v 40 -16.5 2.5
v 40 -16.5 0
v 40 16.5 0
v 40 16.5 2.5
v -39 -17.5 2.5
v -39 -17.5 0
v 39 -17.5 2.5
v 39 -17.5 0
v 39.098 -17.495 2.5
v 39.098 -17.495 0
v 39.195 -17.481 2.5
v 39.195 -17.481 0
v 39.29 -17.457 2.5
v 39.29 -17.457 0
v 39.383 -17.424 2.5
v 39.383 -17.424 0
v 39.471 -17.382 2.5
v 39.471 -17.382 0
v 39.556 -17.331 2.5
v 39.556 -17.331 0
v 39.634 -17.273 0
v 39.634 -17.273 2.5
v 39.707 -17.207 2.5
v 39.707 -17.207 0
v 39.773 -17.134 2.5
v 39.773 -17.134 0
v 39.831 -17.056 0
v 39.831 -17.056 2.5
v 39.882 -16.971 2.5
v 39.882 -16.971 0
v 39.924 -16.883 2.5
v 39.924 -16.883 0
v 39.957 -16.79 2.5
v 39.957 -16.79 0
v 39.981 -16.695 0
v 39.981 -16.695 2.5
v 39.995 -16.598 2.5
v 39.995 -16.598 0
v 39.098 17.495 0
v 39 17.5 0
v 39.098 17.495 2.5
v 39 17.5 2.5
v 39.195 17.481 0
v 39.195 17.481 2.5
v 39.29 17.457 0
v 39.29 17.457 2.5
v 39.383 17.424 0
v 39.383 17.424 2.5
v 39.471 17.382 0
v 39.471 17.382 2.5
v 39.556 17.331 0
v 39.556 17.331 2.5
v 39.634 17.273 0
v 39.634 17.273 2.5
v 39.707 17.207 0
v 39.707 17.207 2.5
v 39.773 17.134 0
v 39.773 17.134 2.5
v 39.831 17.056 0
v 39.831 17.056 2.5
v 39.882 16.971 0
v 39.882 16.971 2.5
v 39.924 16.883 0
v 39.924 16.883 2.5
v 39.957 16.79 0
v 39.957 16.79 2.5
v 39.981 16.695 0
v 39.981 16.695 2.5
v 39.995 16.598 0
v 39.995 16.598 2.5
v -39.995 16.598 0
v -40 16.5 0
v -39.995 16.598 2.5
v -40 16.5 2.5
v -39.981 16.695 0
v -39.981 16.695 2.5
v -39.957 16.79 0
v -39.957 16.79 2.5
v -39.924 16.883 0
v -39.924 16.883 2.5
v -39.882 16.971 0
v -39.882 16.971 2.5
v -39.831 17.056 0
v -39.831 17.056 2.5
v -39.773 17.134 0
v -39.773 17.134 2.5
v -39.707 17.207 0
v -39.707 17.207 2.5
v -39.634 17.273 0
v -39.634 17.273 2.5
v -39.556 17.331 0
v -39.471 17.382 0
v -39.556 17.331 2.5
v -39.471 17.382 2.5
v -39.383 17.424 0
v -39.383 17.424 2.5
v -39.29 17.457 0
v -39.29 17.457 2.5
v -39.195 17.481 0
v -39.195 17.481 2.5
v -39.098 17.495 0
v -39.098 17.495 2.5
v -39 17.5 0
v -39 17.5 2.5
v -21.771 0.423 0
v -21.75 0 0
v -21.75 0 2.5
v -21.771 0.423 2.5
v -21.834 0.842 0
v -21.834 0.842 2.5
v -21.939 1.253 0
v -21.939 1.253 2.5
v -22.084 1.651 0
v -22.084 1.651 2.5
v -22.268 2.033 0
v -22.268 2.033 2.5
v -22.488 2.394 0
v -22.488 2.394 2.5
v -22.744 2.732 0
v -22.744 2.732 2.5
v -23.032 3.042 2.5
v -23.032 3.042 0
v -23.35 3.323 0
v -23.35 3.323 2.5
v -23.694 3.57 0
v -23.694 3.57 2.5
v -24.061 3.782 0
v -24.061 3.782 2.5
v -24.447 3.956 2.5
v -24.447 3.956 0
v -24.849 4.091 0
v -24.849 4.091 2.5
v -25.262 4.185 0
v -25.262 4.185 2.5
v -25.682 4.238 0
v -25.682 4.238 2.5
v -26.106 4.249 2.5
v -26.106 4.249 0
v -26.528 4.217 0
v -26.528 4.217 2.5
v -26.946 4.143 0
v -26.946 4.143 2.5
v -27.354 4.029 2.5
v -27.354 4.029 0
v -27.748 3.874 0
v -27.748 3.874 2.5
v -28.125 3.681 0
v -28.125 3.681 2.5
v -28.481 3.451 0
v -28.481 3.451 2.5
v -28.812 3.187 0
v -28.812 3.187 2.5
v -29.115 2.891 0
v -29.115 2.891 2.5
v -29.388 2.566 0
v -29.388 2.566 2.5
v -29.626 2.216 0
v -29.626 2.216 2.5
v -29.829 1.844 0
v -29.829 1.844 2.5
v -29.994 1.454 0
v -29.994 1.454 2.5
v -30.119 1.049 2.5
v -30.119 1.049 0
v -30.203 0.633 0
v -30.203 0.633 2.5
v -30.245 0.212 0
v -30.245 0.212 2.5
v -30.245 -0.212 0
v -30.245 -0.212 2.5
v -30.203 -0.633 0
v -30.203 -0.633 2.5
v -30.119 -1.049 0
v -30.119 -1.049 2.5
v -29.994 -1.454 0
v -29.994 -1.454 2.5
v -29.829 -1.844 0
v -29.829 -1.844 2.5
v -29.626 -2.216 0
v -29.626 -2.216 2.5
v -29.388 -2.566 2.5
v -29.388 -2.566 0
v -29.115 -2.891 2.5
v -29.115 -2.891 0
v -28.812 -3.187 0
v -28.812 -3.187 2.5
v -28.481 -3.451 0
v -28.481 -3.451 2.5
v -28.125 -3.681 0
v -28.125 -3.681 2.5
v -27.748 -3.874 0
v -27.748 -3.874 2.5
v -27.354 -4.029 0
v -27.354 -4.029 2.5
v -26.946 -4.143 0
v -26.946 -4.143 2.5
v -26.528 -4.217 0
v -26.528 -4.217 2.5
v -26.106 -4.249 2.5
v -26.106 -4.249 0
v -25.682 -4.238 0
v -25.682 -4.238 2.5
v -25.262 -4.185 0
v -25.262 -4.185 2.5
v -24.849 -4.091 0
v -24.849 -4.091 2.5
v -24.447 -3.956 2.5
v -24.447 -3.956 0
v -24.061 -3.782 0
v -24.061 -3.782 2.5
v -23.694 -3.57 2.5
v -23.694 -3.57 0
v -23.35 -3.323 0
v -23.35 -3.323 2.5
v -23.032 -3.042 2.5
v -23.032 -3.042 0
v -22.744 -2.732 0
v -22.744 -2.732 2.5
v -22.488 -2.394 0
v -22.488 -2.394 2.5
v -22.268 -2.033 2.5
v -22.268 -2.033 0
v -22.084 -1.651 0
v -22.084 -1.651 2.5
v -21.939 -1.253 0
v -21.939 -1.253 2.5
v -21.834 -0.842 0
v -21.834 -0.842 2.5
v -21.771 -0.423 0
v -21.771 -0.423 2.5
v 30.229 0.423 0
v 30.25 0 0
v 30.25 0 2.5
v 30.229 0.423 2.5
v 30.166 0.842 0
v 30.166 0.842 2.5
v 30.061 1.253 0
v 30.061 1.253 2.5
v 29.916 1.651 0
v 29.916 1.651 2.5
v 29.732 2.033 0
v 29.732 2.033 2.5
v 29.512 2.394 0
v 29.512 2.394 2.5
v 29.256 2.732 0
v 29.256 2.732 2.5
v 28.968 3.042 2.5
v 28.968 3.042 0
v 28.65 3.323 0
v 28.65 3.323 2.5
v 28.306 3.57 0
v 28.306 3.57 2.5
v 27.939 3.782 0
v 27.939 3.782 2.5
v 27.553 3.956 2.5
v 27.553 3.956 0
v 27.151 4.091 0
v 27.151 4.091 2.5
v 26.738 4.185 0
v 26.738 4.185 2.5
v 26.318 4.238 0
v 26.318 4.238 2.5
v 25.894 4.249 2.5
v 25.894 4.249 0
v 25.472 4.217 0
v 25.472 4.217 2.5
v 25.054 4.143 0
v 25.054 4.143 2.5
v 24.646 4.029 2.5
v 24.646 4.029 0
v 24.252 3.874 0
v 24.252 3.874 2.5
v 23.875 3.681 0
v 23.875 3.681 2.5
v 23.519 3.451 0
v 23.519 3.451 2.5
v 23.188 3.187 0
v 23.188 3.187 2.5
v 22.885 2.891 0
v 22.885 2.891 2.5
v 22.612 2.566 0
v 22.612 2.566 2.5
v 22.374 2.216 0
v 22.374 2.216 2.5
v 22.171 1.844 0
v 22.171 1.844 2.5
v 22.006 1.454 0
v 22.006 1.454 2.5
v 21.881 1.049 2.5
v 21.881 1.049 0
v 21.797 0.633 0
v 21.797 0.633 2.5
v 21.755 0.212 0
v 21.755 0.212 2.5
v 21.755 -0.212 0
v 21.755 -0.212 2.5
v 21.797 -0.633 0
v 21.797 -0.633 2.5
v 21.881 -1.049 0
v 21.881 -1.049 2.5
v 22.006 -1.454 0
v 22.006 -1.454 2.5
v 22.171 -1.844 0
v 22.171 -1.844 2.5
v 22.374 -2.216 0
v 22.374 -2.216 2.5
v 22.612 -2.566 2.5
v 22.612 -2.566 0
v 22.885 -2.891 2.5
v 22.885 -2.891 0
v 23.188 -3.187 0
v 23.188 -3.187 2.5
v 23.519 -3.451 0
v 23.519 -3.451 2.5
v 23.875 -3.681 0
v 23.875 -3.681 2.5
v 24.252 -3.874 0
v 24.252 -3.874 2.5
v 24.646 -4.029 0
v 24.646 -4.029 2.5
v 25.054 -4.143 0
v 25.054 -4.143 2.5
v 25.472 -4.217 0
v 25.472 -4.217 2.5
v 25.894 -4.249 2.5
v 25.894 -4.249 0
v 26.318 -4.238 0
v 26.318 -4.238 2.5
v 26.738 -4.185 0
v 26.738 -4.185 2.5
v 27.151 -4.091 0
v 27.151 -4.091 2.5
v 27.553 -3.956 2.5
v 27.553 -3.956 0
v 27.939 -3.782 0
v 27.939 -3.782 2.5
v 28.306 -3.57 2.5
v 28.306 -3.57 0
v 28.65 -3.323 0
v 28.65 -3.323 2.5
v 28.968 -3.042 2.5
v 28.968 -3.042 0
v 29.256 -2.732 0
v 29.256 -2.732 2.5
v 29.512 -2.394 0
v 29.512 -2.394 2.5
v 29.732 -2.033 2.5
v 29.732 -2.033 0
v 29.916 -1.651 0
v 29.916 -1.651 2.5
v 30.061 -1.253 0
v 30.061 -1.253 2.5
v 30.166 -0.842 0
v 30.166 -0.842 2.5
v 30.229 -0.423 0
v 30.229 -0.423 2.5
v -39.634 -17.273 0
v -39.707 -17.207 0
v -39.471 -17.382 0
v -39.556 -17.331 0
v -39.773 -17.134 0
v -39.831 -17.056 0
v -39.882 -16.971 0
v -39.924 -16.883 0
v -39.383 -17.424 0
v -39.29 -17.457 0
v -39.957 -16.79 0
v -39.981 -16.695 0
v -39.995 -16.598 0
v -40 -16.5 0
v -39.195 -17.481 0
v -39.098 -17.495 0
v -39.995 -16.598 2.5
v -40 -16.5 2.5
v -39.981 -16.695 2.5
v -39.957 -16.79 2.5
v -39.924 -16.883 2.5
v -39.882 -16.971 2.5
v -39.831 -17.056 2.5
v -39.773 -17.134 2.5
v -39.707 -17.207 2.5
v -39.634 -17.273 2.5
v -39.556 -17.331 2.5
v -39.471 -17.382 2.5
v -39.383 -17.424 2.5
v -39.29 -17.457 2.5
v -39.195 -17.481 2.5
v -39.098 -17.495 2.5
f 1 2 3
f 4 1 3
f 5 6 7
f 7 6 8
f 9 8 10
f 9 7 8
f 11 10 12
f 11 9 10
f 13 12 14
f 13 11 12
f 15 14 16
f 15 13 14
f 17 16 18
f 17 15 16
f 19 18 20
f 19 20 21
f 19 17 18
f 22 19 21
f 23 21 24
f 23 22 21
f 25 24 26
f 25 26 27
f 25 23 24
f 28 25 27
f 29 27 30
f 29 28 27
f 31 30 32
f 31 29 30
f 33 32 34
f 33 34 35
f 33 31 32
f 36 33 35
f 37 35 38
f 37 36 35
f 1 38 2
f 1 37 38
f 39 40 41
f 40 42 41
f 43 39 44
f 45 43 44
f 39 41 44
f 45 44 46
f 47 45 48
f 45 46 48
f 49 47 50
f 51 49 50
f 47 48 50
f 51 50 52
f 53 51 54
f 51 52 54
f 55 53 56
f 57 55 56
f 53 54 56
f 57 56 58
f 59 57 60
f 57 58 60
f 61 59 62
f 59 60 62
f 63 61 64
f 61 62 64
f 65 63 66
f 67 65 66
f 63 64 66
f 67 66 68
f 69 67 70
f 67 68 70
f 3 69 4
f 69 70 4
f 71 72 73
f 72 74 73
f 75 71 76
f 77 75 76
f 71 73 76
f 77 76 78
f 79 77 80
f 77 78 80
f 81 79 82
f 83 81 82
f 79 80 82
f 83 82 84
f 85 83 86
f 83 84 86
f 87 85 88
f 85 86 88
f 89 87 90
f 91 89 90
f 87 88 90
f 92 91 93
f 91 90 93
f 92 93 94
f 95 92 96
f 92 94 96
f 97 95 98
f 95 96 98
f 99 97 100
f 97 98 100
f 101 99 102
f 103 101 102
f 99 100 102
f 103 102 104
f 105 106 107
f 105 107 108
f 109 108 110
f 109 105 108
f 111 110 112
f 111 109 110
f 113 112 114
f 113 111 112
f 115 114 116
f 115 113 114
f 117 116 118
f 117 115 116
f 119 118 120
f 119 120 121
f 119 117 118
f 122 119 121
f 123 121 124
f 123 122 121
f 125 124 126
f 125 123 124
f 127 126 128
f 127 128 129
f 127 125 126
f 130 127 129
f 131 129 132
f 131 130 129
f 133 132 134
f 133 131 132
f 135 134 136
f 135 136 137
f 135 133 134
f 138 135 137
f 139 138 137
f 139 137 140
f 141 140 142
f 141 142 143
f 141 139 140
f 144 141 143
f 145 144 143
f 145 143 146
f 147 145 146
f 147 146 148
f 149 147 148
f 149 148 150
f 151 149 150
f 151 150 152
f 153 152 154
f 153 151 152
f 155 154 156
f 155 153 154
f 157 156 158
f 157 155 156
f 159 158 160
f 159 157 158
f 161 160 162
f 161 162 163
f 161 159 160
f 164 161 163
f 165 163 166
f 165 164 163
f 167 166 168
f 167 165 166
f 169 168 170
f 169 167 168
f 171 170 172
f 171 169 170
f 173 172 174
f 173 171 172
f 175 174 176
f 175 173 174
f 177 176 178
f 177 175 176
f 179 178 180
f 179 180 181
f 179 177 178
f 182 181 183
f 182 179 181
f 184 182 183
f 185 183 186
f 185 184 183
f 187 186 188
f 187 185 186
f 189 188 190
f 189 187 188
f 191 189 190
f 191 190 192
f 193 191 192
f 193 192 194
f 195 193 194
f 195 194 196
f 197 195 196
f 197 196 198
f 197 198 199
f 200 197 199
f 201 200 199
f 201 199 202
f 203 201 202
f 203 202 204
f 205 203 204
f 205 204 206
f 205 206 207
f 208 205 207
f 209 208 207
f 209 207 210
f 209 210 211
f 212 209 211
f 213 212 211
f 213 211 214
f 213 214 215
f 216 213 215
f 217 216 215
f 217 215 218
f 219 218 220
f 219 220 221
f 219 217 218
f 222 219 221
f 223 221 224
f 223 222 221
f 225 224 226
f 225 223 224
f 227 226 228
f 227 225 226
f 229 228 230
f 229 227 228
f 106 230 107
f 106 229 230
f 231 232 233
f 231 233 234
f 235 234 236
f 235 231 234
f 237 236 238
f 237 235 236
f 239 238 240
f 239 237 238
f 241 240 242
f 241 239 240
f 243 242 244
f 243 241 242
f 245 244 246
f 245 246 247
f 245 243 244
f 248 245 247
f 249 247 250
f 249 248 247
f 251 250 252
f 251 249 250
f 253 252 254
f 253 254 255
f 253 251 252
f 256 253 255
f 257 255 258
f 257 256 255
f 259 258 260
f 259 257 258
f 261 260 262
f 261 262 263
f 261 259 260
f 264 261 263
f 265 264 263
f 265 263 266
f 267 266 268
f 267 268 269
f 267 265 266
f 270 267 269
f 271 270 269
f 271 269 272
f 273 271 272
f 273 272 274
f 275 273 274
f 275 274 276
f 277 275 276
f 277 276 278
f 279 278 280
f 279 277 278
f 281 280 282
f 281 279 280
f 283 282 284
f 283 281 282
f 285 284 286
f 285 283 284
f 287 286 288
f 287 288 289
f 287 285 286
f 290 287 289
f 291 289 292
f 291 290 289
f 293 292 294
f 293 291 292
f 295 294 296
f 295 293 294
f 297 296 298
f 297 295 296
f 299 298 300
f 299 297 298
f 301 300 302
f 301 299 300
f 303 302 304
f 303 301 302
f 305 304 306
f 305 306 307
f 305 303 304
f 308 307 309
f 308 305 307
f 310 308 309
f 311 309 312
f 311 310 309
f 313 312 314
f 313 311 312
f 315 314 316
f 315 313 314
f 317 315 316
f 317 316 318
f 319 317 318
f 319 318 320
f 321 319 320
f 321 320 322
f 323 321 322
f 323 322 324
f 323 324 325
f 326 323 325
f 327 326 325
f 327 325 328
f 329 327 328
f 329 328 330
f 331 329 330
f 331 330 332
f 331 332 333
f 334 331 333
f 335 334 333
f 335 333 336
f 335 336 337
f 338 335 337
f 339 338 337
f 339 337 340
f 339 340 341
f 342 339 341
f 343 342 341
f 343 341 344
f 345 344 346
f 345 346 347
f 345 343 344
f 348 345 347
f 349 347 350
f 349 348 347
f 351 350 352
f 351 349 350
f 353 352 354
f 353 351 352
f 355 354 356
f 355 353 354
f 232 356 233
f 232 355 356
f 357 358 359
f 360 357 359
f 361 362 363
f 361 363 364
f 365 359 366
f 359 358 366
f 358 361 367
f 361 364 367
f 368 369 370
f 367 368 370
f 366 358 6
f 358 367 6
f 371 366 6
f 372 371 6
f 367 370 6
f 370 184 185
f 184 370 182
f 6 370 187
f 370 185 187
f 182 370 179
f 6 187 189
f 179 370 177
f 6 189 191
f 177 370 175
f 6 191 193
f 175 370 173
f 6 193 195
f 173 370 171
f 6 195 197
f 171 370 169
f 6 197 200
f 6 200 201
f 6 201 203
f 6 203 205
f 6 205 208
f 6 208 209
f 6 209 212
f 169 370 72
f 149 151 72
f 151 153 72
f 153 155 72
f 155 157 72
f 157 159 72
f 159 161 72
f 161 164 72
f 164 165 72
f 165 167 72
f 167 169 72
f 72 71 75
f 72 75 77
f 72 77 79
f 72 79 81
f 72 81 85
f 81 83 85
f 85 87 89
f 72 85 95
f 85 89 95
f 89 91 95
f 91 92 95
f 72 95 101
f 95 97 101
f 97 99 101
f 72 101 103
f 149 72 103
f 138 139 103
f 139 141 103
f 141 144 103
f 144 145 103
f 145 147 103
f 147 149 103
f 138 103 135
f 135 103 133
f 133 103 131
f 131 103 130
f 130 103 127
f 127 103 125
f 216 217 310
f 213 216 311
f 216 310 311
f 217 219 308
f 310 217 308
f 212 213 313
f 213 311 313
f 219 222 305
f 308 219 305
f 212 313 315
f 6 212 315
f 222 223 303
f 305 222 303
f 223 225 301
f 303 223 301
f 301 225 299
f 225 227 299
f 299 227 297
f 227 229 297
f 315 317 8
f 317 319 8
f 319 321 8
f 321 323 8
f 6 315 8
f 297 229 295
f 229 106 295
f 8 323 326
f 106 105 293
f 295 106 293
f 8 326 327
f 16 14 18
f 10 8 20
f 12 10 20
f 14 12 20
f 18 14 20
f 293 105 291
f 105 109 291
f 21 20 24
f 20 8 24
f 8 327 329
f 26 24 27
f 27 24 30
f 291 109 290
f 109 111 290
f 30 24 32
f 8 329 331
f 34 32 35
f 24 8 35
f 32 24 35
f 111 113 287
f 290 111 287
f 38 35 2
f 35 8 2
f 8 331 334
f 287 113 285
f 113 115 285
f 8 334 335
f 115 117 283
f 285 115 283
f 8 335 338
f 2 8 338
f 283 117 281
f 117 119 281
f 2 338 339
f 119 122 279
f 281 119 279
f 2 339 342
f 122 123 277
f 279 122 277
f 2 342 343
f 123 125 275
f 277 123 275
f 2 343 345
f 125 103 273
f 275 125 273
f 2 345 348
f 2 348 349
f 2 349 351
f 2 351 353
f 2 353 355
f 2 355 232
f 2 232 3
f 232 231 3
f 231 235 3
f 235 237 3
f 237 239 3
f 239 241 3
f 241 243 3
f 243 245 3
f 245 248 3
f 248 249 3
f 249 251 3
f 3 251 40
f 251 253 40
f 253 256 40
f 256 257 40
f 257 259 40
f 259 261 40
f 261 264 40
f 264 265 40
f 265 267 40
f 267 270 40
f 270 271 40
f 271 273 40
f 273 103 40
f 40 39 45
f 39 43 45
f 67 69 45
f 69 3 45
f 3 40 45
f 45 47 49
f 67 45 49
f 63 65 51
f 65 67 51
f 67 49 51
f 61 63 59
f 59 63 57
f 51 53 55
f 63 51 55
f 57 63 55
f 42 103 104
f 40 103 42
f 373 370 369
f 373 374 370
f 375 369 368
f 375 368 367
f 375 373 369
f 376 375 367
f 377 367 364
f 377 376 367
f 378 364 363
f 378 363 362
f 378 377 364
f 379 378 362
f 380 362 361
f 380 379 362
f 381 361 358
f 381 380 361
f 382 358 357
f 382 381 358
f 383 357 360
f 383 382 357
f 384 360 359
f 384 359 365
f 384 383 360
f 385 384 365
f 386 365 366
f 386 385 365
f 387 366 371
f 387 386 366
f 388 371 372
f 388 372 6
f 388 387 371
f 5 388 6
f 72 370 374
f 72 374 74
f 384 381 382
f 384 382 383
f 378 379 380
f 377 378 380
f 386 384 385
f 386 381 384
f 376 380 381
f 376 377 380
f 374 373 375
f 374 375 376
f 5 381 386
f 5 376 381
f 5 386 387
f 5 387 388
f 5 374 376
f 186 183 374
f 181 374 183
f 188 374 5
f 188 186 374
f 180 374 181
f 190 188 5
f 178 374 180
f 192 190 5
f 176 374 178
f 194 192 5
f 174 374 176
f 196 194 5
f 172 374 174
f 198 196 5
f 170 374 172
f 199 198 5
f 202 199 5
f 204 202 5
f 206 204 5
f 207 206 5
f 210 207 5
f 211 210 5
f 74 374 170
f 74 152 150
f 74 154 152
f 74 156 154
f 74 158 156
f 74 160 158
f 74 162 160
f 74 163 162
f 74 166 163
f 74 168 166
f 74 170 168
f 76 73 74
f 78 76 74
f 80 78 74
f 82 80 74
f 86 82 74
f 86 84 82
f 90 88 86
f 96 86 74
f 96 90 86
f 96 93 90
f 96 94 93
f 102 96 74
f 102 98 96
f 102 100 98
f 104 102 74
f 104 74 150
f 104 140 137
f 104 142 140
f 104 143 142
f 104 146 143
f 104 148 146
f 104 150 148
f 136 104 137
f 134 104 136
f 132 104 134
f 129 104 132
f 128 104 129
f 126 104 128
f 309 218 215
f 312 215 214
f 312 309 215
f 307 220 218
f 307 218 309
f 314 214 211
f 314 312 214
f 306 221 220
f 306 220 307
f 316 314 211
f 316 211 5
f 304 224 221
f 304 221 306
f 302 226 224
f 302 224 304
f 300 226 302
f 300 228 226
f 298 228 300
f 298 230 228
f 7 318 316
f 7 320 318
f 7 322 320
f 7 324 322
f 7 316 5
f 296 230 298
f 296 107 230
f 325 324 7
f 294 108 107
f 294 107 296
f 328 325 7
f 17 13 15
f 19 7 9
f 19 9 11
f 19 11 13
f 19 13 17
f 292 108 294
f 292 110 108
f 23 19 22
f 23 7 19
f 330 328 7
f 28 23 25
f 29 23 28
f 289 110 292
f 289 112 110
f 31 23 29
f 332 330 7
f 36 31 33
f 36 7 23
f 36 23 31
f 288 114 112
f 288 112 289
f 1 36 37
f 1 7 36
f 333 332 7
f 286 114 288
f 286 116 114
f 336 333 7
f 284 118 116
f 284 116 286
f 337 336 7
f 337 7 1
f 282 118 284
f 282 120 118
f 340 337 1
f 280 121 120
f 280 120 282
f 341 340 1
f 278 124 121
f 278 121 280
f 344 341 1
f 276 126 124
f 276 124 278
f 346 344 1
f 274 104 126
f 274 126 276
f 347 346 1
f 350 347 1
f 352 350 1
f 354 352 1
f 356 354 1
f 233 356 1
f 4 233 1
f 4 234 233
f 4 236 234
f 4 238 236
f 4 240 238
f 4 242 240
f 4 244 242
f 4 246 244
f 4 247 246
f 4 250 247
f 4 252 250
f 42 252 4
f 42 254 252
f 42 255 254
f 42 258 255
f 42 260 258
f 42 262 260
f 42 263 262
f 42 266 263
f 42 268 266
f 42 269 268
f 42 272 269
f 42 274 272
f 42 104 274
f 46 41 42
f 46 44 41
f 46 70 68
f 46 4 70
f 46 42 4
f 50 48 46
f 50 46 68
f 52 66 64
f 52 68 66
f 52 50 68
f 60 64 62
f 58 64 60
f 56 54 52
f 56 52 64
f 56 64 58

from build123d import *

# Parameters (mm, degrees)
SKETCH_1_W      = 80
SKETCH_1_H      = 35
SKETCH_1_R      = 4.25
EXTRUDE_1_DEPTH = 2.5
FILLET_1_R      = 1


with BuildPart() as part:
    # Эскиз1 → Бобышка-Вытянуть1 (new body)
    with BuildSketch(Plane.XY):
        Rectangle(SKETCH_1_W, SKETCH_1_H)
        with Locations((-26, 0)):
            Circle(SKETCH_1_R, mode=Mode.SUBTRACT)
        with Locations((26, 0)):
            Circle(SKETCH_1_R, mode=Mode.SUBTRACT)
    extrude(amount=EXTRUDE_1_DEPTH)

    # Скругление1
    fillet_1_edges = [part.edges().sort_by_distance(p)[0] for p in [
        (40, -17.5, 1.25),
        (-40, -17.5, 1.25),
        (-40, 17.5, 1.25),
        (40, 17.5, 1.25),
    ]]
    fillet(fillet_1_edges, radius=FILLET_1_R)


solid = part.part
